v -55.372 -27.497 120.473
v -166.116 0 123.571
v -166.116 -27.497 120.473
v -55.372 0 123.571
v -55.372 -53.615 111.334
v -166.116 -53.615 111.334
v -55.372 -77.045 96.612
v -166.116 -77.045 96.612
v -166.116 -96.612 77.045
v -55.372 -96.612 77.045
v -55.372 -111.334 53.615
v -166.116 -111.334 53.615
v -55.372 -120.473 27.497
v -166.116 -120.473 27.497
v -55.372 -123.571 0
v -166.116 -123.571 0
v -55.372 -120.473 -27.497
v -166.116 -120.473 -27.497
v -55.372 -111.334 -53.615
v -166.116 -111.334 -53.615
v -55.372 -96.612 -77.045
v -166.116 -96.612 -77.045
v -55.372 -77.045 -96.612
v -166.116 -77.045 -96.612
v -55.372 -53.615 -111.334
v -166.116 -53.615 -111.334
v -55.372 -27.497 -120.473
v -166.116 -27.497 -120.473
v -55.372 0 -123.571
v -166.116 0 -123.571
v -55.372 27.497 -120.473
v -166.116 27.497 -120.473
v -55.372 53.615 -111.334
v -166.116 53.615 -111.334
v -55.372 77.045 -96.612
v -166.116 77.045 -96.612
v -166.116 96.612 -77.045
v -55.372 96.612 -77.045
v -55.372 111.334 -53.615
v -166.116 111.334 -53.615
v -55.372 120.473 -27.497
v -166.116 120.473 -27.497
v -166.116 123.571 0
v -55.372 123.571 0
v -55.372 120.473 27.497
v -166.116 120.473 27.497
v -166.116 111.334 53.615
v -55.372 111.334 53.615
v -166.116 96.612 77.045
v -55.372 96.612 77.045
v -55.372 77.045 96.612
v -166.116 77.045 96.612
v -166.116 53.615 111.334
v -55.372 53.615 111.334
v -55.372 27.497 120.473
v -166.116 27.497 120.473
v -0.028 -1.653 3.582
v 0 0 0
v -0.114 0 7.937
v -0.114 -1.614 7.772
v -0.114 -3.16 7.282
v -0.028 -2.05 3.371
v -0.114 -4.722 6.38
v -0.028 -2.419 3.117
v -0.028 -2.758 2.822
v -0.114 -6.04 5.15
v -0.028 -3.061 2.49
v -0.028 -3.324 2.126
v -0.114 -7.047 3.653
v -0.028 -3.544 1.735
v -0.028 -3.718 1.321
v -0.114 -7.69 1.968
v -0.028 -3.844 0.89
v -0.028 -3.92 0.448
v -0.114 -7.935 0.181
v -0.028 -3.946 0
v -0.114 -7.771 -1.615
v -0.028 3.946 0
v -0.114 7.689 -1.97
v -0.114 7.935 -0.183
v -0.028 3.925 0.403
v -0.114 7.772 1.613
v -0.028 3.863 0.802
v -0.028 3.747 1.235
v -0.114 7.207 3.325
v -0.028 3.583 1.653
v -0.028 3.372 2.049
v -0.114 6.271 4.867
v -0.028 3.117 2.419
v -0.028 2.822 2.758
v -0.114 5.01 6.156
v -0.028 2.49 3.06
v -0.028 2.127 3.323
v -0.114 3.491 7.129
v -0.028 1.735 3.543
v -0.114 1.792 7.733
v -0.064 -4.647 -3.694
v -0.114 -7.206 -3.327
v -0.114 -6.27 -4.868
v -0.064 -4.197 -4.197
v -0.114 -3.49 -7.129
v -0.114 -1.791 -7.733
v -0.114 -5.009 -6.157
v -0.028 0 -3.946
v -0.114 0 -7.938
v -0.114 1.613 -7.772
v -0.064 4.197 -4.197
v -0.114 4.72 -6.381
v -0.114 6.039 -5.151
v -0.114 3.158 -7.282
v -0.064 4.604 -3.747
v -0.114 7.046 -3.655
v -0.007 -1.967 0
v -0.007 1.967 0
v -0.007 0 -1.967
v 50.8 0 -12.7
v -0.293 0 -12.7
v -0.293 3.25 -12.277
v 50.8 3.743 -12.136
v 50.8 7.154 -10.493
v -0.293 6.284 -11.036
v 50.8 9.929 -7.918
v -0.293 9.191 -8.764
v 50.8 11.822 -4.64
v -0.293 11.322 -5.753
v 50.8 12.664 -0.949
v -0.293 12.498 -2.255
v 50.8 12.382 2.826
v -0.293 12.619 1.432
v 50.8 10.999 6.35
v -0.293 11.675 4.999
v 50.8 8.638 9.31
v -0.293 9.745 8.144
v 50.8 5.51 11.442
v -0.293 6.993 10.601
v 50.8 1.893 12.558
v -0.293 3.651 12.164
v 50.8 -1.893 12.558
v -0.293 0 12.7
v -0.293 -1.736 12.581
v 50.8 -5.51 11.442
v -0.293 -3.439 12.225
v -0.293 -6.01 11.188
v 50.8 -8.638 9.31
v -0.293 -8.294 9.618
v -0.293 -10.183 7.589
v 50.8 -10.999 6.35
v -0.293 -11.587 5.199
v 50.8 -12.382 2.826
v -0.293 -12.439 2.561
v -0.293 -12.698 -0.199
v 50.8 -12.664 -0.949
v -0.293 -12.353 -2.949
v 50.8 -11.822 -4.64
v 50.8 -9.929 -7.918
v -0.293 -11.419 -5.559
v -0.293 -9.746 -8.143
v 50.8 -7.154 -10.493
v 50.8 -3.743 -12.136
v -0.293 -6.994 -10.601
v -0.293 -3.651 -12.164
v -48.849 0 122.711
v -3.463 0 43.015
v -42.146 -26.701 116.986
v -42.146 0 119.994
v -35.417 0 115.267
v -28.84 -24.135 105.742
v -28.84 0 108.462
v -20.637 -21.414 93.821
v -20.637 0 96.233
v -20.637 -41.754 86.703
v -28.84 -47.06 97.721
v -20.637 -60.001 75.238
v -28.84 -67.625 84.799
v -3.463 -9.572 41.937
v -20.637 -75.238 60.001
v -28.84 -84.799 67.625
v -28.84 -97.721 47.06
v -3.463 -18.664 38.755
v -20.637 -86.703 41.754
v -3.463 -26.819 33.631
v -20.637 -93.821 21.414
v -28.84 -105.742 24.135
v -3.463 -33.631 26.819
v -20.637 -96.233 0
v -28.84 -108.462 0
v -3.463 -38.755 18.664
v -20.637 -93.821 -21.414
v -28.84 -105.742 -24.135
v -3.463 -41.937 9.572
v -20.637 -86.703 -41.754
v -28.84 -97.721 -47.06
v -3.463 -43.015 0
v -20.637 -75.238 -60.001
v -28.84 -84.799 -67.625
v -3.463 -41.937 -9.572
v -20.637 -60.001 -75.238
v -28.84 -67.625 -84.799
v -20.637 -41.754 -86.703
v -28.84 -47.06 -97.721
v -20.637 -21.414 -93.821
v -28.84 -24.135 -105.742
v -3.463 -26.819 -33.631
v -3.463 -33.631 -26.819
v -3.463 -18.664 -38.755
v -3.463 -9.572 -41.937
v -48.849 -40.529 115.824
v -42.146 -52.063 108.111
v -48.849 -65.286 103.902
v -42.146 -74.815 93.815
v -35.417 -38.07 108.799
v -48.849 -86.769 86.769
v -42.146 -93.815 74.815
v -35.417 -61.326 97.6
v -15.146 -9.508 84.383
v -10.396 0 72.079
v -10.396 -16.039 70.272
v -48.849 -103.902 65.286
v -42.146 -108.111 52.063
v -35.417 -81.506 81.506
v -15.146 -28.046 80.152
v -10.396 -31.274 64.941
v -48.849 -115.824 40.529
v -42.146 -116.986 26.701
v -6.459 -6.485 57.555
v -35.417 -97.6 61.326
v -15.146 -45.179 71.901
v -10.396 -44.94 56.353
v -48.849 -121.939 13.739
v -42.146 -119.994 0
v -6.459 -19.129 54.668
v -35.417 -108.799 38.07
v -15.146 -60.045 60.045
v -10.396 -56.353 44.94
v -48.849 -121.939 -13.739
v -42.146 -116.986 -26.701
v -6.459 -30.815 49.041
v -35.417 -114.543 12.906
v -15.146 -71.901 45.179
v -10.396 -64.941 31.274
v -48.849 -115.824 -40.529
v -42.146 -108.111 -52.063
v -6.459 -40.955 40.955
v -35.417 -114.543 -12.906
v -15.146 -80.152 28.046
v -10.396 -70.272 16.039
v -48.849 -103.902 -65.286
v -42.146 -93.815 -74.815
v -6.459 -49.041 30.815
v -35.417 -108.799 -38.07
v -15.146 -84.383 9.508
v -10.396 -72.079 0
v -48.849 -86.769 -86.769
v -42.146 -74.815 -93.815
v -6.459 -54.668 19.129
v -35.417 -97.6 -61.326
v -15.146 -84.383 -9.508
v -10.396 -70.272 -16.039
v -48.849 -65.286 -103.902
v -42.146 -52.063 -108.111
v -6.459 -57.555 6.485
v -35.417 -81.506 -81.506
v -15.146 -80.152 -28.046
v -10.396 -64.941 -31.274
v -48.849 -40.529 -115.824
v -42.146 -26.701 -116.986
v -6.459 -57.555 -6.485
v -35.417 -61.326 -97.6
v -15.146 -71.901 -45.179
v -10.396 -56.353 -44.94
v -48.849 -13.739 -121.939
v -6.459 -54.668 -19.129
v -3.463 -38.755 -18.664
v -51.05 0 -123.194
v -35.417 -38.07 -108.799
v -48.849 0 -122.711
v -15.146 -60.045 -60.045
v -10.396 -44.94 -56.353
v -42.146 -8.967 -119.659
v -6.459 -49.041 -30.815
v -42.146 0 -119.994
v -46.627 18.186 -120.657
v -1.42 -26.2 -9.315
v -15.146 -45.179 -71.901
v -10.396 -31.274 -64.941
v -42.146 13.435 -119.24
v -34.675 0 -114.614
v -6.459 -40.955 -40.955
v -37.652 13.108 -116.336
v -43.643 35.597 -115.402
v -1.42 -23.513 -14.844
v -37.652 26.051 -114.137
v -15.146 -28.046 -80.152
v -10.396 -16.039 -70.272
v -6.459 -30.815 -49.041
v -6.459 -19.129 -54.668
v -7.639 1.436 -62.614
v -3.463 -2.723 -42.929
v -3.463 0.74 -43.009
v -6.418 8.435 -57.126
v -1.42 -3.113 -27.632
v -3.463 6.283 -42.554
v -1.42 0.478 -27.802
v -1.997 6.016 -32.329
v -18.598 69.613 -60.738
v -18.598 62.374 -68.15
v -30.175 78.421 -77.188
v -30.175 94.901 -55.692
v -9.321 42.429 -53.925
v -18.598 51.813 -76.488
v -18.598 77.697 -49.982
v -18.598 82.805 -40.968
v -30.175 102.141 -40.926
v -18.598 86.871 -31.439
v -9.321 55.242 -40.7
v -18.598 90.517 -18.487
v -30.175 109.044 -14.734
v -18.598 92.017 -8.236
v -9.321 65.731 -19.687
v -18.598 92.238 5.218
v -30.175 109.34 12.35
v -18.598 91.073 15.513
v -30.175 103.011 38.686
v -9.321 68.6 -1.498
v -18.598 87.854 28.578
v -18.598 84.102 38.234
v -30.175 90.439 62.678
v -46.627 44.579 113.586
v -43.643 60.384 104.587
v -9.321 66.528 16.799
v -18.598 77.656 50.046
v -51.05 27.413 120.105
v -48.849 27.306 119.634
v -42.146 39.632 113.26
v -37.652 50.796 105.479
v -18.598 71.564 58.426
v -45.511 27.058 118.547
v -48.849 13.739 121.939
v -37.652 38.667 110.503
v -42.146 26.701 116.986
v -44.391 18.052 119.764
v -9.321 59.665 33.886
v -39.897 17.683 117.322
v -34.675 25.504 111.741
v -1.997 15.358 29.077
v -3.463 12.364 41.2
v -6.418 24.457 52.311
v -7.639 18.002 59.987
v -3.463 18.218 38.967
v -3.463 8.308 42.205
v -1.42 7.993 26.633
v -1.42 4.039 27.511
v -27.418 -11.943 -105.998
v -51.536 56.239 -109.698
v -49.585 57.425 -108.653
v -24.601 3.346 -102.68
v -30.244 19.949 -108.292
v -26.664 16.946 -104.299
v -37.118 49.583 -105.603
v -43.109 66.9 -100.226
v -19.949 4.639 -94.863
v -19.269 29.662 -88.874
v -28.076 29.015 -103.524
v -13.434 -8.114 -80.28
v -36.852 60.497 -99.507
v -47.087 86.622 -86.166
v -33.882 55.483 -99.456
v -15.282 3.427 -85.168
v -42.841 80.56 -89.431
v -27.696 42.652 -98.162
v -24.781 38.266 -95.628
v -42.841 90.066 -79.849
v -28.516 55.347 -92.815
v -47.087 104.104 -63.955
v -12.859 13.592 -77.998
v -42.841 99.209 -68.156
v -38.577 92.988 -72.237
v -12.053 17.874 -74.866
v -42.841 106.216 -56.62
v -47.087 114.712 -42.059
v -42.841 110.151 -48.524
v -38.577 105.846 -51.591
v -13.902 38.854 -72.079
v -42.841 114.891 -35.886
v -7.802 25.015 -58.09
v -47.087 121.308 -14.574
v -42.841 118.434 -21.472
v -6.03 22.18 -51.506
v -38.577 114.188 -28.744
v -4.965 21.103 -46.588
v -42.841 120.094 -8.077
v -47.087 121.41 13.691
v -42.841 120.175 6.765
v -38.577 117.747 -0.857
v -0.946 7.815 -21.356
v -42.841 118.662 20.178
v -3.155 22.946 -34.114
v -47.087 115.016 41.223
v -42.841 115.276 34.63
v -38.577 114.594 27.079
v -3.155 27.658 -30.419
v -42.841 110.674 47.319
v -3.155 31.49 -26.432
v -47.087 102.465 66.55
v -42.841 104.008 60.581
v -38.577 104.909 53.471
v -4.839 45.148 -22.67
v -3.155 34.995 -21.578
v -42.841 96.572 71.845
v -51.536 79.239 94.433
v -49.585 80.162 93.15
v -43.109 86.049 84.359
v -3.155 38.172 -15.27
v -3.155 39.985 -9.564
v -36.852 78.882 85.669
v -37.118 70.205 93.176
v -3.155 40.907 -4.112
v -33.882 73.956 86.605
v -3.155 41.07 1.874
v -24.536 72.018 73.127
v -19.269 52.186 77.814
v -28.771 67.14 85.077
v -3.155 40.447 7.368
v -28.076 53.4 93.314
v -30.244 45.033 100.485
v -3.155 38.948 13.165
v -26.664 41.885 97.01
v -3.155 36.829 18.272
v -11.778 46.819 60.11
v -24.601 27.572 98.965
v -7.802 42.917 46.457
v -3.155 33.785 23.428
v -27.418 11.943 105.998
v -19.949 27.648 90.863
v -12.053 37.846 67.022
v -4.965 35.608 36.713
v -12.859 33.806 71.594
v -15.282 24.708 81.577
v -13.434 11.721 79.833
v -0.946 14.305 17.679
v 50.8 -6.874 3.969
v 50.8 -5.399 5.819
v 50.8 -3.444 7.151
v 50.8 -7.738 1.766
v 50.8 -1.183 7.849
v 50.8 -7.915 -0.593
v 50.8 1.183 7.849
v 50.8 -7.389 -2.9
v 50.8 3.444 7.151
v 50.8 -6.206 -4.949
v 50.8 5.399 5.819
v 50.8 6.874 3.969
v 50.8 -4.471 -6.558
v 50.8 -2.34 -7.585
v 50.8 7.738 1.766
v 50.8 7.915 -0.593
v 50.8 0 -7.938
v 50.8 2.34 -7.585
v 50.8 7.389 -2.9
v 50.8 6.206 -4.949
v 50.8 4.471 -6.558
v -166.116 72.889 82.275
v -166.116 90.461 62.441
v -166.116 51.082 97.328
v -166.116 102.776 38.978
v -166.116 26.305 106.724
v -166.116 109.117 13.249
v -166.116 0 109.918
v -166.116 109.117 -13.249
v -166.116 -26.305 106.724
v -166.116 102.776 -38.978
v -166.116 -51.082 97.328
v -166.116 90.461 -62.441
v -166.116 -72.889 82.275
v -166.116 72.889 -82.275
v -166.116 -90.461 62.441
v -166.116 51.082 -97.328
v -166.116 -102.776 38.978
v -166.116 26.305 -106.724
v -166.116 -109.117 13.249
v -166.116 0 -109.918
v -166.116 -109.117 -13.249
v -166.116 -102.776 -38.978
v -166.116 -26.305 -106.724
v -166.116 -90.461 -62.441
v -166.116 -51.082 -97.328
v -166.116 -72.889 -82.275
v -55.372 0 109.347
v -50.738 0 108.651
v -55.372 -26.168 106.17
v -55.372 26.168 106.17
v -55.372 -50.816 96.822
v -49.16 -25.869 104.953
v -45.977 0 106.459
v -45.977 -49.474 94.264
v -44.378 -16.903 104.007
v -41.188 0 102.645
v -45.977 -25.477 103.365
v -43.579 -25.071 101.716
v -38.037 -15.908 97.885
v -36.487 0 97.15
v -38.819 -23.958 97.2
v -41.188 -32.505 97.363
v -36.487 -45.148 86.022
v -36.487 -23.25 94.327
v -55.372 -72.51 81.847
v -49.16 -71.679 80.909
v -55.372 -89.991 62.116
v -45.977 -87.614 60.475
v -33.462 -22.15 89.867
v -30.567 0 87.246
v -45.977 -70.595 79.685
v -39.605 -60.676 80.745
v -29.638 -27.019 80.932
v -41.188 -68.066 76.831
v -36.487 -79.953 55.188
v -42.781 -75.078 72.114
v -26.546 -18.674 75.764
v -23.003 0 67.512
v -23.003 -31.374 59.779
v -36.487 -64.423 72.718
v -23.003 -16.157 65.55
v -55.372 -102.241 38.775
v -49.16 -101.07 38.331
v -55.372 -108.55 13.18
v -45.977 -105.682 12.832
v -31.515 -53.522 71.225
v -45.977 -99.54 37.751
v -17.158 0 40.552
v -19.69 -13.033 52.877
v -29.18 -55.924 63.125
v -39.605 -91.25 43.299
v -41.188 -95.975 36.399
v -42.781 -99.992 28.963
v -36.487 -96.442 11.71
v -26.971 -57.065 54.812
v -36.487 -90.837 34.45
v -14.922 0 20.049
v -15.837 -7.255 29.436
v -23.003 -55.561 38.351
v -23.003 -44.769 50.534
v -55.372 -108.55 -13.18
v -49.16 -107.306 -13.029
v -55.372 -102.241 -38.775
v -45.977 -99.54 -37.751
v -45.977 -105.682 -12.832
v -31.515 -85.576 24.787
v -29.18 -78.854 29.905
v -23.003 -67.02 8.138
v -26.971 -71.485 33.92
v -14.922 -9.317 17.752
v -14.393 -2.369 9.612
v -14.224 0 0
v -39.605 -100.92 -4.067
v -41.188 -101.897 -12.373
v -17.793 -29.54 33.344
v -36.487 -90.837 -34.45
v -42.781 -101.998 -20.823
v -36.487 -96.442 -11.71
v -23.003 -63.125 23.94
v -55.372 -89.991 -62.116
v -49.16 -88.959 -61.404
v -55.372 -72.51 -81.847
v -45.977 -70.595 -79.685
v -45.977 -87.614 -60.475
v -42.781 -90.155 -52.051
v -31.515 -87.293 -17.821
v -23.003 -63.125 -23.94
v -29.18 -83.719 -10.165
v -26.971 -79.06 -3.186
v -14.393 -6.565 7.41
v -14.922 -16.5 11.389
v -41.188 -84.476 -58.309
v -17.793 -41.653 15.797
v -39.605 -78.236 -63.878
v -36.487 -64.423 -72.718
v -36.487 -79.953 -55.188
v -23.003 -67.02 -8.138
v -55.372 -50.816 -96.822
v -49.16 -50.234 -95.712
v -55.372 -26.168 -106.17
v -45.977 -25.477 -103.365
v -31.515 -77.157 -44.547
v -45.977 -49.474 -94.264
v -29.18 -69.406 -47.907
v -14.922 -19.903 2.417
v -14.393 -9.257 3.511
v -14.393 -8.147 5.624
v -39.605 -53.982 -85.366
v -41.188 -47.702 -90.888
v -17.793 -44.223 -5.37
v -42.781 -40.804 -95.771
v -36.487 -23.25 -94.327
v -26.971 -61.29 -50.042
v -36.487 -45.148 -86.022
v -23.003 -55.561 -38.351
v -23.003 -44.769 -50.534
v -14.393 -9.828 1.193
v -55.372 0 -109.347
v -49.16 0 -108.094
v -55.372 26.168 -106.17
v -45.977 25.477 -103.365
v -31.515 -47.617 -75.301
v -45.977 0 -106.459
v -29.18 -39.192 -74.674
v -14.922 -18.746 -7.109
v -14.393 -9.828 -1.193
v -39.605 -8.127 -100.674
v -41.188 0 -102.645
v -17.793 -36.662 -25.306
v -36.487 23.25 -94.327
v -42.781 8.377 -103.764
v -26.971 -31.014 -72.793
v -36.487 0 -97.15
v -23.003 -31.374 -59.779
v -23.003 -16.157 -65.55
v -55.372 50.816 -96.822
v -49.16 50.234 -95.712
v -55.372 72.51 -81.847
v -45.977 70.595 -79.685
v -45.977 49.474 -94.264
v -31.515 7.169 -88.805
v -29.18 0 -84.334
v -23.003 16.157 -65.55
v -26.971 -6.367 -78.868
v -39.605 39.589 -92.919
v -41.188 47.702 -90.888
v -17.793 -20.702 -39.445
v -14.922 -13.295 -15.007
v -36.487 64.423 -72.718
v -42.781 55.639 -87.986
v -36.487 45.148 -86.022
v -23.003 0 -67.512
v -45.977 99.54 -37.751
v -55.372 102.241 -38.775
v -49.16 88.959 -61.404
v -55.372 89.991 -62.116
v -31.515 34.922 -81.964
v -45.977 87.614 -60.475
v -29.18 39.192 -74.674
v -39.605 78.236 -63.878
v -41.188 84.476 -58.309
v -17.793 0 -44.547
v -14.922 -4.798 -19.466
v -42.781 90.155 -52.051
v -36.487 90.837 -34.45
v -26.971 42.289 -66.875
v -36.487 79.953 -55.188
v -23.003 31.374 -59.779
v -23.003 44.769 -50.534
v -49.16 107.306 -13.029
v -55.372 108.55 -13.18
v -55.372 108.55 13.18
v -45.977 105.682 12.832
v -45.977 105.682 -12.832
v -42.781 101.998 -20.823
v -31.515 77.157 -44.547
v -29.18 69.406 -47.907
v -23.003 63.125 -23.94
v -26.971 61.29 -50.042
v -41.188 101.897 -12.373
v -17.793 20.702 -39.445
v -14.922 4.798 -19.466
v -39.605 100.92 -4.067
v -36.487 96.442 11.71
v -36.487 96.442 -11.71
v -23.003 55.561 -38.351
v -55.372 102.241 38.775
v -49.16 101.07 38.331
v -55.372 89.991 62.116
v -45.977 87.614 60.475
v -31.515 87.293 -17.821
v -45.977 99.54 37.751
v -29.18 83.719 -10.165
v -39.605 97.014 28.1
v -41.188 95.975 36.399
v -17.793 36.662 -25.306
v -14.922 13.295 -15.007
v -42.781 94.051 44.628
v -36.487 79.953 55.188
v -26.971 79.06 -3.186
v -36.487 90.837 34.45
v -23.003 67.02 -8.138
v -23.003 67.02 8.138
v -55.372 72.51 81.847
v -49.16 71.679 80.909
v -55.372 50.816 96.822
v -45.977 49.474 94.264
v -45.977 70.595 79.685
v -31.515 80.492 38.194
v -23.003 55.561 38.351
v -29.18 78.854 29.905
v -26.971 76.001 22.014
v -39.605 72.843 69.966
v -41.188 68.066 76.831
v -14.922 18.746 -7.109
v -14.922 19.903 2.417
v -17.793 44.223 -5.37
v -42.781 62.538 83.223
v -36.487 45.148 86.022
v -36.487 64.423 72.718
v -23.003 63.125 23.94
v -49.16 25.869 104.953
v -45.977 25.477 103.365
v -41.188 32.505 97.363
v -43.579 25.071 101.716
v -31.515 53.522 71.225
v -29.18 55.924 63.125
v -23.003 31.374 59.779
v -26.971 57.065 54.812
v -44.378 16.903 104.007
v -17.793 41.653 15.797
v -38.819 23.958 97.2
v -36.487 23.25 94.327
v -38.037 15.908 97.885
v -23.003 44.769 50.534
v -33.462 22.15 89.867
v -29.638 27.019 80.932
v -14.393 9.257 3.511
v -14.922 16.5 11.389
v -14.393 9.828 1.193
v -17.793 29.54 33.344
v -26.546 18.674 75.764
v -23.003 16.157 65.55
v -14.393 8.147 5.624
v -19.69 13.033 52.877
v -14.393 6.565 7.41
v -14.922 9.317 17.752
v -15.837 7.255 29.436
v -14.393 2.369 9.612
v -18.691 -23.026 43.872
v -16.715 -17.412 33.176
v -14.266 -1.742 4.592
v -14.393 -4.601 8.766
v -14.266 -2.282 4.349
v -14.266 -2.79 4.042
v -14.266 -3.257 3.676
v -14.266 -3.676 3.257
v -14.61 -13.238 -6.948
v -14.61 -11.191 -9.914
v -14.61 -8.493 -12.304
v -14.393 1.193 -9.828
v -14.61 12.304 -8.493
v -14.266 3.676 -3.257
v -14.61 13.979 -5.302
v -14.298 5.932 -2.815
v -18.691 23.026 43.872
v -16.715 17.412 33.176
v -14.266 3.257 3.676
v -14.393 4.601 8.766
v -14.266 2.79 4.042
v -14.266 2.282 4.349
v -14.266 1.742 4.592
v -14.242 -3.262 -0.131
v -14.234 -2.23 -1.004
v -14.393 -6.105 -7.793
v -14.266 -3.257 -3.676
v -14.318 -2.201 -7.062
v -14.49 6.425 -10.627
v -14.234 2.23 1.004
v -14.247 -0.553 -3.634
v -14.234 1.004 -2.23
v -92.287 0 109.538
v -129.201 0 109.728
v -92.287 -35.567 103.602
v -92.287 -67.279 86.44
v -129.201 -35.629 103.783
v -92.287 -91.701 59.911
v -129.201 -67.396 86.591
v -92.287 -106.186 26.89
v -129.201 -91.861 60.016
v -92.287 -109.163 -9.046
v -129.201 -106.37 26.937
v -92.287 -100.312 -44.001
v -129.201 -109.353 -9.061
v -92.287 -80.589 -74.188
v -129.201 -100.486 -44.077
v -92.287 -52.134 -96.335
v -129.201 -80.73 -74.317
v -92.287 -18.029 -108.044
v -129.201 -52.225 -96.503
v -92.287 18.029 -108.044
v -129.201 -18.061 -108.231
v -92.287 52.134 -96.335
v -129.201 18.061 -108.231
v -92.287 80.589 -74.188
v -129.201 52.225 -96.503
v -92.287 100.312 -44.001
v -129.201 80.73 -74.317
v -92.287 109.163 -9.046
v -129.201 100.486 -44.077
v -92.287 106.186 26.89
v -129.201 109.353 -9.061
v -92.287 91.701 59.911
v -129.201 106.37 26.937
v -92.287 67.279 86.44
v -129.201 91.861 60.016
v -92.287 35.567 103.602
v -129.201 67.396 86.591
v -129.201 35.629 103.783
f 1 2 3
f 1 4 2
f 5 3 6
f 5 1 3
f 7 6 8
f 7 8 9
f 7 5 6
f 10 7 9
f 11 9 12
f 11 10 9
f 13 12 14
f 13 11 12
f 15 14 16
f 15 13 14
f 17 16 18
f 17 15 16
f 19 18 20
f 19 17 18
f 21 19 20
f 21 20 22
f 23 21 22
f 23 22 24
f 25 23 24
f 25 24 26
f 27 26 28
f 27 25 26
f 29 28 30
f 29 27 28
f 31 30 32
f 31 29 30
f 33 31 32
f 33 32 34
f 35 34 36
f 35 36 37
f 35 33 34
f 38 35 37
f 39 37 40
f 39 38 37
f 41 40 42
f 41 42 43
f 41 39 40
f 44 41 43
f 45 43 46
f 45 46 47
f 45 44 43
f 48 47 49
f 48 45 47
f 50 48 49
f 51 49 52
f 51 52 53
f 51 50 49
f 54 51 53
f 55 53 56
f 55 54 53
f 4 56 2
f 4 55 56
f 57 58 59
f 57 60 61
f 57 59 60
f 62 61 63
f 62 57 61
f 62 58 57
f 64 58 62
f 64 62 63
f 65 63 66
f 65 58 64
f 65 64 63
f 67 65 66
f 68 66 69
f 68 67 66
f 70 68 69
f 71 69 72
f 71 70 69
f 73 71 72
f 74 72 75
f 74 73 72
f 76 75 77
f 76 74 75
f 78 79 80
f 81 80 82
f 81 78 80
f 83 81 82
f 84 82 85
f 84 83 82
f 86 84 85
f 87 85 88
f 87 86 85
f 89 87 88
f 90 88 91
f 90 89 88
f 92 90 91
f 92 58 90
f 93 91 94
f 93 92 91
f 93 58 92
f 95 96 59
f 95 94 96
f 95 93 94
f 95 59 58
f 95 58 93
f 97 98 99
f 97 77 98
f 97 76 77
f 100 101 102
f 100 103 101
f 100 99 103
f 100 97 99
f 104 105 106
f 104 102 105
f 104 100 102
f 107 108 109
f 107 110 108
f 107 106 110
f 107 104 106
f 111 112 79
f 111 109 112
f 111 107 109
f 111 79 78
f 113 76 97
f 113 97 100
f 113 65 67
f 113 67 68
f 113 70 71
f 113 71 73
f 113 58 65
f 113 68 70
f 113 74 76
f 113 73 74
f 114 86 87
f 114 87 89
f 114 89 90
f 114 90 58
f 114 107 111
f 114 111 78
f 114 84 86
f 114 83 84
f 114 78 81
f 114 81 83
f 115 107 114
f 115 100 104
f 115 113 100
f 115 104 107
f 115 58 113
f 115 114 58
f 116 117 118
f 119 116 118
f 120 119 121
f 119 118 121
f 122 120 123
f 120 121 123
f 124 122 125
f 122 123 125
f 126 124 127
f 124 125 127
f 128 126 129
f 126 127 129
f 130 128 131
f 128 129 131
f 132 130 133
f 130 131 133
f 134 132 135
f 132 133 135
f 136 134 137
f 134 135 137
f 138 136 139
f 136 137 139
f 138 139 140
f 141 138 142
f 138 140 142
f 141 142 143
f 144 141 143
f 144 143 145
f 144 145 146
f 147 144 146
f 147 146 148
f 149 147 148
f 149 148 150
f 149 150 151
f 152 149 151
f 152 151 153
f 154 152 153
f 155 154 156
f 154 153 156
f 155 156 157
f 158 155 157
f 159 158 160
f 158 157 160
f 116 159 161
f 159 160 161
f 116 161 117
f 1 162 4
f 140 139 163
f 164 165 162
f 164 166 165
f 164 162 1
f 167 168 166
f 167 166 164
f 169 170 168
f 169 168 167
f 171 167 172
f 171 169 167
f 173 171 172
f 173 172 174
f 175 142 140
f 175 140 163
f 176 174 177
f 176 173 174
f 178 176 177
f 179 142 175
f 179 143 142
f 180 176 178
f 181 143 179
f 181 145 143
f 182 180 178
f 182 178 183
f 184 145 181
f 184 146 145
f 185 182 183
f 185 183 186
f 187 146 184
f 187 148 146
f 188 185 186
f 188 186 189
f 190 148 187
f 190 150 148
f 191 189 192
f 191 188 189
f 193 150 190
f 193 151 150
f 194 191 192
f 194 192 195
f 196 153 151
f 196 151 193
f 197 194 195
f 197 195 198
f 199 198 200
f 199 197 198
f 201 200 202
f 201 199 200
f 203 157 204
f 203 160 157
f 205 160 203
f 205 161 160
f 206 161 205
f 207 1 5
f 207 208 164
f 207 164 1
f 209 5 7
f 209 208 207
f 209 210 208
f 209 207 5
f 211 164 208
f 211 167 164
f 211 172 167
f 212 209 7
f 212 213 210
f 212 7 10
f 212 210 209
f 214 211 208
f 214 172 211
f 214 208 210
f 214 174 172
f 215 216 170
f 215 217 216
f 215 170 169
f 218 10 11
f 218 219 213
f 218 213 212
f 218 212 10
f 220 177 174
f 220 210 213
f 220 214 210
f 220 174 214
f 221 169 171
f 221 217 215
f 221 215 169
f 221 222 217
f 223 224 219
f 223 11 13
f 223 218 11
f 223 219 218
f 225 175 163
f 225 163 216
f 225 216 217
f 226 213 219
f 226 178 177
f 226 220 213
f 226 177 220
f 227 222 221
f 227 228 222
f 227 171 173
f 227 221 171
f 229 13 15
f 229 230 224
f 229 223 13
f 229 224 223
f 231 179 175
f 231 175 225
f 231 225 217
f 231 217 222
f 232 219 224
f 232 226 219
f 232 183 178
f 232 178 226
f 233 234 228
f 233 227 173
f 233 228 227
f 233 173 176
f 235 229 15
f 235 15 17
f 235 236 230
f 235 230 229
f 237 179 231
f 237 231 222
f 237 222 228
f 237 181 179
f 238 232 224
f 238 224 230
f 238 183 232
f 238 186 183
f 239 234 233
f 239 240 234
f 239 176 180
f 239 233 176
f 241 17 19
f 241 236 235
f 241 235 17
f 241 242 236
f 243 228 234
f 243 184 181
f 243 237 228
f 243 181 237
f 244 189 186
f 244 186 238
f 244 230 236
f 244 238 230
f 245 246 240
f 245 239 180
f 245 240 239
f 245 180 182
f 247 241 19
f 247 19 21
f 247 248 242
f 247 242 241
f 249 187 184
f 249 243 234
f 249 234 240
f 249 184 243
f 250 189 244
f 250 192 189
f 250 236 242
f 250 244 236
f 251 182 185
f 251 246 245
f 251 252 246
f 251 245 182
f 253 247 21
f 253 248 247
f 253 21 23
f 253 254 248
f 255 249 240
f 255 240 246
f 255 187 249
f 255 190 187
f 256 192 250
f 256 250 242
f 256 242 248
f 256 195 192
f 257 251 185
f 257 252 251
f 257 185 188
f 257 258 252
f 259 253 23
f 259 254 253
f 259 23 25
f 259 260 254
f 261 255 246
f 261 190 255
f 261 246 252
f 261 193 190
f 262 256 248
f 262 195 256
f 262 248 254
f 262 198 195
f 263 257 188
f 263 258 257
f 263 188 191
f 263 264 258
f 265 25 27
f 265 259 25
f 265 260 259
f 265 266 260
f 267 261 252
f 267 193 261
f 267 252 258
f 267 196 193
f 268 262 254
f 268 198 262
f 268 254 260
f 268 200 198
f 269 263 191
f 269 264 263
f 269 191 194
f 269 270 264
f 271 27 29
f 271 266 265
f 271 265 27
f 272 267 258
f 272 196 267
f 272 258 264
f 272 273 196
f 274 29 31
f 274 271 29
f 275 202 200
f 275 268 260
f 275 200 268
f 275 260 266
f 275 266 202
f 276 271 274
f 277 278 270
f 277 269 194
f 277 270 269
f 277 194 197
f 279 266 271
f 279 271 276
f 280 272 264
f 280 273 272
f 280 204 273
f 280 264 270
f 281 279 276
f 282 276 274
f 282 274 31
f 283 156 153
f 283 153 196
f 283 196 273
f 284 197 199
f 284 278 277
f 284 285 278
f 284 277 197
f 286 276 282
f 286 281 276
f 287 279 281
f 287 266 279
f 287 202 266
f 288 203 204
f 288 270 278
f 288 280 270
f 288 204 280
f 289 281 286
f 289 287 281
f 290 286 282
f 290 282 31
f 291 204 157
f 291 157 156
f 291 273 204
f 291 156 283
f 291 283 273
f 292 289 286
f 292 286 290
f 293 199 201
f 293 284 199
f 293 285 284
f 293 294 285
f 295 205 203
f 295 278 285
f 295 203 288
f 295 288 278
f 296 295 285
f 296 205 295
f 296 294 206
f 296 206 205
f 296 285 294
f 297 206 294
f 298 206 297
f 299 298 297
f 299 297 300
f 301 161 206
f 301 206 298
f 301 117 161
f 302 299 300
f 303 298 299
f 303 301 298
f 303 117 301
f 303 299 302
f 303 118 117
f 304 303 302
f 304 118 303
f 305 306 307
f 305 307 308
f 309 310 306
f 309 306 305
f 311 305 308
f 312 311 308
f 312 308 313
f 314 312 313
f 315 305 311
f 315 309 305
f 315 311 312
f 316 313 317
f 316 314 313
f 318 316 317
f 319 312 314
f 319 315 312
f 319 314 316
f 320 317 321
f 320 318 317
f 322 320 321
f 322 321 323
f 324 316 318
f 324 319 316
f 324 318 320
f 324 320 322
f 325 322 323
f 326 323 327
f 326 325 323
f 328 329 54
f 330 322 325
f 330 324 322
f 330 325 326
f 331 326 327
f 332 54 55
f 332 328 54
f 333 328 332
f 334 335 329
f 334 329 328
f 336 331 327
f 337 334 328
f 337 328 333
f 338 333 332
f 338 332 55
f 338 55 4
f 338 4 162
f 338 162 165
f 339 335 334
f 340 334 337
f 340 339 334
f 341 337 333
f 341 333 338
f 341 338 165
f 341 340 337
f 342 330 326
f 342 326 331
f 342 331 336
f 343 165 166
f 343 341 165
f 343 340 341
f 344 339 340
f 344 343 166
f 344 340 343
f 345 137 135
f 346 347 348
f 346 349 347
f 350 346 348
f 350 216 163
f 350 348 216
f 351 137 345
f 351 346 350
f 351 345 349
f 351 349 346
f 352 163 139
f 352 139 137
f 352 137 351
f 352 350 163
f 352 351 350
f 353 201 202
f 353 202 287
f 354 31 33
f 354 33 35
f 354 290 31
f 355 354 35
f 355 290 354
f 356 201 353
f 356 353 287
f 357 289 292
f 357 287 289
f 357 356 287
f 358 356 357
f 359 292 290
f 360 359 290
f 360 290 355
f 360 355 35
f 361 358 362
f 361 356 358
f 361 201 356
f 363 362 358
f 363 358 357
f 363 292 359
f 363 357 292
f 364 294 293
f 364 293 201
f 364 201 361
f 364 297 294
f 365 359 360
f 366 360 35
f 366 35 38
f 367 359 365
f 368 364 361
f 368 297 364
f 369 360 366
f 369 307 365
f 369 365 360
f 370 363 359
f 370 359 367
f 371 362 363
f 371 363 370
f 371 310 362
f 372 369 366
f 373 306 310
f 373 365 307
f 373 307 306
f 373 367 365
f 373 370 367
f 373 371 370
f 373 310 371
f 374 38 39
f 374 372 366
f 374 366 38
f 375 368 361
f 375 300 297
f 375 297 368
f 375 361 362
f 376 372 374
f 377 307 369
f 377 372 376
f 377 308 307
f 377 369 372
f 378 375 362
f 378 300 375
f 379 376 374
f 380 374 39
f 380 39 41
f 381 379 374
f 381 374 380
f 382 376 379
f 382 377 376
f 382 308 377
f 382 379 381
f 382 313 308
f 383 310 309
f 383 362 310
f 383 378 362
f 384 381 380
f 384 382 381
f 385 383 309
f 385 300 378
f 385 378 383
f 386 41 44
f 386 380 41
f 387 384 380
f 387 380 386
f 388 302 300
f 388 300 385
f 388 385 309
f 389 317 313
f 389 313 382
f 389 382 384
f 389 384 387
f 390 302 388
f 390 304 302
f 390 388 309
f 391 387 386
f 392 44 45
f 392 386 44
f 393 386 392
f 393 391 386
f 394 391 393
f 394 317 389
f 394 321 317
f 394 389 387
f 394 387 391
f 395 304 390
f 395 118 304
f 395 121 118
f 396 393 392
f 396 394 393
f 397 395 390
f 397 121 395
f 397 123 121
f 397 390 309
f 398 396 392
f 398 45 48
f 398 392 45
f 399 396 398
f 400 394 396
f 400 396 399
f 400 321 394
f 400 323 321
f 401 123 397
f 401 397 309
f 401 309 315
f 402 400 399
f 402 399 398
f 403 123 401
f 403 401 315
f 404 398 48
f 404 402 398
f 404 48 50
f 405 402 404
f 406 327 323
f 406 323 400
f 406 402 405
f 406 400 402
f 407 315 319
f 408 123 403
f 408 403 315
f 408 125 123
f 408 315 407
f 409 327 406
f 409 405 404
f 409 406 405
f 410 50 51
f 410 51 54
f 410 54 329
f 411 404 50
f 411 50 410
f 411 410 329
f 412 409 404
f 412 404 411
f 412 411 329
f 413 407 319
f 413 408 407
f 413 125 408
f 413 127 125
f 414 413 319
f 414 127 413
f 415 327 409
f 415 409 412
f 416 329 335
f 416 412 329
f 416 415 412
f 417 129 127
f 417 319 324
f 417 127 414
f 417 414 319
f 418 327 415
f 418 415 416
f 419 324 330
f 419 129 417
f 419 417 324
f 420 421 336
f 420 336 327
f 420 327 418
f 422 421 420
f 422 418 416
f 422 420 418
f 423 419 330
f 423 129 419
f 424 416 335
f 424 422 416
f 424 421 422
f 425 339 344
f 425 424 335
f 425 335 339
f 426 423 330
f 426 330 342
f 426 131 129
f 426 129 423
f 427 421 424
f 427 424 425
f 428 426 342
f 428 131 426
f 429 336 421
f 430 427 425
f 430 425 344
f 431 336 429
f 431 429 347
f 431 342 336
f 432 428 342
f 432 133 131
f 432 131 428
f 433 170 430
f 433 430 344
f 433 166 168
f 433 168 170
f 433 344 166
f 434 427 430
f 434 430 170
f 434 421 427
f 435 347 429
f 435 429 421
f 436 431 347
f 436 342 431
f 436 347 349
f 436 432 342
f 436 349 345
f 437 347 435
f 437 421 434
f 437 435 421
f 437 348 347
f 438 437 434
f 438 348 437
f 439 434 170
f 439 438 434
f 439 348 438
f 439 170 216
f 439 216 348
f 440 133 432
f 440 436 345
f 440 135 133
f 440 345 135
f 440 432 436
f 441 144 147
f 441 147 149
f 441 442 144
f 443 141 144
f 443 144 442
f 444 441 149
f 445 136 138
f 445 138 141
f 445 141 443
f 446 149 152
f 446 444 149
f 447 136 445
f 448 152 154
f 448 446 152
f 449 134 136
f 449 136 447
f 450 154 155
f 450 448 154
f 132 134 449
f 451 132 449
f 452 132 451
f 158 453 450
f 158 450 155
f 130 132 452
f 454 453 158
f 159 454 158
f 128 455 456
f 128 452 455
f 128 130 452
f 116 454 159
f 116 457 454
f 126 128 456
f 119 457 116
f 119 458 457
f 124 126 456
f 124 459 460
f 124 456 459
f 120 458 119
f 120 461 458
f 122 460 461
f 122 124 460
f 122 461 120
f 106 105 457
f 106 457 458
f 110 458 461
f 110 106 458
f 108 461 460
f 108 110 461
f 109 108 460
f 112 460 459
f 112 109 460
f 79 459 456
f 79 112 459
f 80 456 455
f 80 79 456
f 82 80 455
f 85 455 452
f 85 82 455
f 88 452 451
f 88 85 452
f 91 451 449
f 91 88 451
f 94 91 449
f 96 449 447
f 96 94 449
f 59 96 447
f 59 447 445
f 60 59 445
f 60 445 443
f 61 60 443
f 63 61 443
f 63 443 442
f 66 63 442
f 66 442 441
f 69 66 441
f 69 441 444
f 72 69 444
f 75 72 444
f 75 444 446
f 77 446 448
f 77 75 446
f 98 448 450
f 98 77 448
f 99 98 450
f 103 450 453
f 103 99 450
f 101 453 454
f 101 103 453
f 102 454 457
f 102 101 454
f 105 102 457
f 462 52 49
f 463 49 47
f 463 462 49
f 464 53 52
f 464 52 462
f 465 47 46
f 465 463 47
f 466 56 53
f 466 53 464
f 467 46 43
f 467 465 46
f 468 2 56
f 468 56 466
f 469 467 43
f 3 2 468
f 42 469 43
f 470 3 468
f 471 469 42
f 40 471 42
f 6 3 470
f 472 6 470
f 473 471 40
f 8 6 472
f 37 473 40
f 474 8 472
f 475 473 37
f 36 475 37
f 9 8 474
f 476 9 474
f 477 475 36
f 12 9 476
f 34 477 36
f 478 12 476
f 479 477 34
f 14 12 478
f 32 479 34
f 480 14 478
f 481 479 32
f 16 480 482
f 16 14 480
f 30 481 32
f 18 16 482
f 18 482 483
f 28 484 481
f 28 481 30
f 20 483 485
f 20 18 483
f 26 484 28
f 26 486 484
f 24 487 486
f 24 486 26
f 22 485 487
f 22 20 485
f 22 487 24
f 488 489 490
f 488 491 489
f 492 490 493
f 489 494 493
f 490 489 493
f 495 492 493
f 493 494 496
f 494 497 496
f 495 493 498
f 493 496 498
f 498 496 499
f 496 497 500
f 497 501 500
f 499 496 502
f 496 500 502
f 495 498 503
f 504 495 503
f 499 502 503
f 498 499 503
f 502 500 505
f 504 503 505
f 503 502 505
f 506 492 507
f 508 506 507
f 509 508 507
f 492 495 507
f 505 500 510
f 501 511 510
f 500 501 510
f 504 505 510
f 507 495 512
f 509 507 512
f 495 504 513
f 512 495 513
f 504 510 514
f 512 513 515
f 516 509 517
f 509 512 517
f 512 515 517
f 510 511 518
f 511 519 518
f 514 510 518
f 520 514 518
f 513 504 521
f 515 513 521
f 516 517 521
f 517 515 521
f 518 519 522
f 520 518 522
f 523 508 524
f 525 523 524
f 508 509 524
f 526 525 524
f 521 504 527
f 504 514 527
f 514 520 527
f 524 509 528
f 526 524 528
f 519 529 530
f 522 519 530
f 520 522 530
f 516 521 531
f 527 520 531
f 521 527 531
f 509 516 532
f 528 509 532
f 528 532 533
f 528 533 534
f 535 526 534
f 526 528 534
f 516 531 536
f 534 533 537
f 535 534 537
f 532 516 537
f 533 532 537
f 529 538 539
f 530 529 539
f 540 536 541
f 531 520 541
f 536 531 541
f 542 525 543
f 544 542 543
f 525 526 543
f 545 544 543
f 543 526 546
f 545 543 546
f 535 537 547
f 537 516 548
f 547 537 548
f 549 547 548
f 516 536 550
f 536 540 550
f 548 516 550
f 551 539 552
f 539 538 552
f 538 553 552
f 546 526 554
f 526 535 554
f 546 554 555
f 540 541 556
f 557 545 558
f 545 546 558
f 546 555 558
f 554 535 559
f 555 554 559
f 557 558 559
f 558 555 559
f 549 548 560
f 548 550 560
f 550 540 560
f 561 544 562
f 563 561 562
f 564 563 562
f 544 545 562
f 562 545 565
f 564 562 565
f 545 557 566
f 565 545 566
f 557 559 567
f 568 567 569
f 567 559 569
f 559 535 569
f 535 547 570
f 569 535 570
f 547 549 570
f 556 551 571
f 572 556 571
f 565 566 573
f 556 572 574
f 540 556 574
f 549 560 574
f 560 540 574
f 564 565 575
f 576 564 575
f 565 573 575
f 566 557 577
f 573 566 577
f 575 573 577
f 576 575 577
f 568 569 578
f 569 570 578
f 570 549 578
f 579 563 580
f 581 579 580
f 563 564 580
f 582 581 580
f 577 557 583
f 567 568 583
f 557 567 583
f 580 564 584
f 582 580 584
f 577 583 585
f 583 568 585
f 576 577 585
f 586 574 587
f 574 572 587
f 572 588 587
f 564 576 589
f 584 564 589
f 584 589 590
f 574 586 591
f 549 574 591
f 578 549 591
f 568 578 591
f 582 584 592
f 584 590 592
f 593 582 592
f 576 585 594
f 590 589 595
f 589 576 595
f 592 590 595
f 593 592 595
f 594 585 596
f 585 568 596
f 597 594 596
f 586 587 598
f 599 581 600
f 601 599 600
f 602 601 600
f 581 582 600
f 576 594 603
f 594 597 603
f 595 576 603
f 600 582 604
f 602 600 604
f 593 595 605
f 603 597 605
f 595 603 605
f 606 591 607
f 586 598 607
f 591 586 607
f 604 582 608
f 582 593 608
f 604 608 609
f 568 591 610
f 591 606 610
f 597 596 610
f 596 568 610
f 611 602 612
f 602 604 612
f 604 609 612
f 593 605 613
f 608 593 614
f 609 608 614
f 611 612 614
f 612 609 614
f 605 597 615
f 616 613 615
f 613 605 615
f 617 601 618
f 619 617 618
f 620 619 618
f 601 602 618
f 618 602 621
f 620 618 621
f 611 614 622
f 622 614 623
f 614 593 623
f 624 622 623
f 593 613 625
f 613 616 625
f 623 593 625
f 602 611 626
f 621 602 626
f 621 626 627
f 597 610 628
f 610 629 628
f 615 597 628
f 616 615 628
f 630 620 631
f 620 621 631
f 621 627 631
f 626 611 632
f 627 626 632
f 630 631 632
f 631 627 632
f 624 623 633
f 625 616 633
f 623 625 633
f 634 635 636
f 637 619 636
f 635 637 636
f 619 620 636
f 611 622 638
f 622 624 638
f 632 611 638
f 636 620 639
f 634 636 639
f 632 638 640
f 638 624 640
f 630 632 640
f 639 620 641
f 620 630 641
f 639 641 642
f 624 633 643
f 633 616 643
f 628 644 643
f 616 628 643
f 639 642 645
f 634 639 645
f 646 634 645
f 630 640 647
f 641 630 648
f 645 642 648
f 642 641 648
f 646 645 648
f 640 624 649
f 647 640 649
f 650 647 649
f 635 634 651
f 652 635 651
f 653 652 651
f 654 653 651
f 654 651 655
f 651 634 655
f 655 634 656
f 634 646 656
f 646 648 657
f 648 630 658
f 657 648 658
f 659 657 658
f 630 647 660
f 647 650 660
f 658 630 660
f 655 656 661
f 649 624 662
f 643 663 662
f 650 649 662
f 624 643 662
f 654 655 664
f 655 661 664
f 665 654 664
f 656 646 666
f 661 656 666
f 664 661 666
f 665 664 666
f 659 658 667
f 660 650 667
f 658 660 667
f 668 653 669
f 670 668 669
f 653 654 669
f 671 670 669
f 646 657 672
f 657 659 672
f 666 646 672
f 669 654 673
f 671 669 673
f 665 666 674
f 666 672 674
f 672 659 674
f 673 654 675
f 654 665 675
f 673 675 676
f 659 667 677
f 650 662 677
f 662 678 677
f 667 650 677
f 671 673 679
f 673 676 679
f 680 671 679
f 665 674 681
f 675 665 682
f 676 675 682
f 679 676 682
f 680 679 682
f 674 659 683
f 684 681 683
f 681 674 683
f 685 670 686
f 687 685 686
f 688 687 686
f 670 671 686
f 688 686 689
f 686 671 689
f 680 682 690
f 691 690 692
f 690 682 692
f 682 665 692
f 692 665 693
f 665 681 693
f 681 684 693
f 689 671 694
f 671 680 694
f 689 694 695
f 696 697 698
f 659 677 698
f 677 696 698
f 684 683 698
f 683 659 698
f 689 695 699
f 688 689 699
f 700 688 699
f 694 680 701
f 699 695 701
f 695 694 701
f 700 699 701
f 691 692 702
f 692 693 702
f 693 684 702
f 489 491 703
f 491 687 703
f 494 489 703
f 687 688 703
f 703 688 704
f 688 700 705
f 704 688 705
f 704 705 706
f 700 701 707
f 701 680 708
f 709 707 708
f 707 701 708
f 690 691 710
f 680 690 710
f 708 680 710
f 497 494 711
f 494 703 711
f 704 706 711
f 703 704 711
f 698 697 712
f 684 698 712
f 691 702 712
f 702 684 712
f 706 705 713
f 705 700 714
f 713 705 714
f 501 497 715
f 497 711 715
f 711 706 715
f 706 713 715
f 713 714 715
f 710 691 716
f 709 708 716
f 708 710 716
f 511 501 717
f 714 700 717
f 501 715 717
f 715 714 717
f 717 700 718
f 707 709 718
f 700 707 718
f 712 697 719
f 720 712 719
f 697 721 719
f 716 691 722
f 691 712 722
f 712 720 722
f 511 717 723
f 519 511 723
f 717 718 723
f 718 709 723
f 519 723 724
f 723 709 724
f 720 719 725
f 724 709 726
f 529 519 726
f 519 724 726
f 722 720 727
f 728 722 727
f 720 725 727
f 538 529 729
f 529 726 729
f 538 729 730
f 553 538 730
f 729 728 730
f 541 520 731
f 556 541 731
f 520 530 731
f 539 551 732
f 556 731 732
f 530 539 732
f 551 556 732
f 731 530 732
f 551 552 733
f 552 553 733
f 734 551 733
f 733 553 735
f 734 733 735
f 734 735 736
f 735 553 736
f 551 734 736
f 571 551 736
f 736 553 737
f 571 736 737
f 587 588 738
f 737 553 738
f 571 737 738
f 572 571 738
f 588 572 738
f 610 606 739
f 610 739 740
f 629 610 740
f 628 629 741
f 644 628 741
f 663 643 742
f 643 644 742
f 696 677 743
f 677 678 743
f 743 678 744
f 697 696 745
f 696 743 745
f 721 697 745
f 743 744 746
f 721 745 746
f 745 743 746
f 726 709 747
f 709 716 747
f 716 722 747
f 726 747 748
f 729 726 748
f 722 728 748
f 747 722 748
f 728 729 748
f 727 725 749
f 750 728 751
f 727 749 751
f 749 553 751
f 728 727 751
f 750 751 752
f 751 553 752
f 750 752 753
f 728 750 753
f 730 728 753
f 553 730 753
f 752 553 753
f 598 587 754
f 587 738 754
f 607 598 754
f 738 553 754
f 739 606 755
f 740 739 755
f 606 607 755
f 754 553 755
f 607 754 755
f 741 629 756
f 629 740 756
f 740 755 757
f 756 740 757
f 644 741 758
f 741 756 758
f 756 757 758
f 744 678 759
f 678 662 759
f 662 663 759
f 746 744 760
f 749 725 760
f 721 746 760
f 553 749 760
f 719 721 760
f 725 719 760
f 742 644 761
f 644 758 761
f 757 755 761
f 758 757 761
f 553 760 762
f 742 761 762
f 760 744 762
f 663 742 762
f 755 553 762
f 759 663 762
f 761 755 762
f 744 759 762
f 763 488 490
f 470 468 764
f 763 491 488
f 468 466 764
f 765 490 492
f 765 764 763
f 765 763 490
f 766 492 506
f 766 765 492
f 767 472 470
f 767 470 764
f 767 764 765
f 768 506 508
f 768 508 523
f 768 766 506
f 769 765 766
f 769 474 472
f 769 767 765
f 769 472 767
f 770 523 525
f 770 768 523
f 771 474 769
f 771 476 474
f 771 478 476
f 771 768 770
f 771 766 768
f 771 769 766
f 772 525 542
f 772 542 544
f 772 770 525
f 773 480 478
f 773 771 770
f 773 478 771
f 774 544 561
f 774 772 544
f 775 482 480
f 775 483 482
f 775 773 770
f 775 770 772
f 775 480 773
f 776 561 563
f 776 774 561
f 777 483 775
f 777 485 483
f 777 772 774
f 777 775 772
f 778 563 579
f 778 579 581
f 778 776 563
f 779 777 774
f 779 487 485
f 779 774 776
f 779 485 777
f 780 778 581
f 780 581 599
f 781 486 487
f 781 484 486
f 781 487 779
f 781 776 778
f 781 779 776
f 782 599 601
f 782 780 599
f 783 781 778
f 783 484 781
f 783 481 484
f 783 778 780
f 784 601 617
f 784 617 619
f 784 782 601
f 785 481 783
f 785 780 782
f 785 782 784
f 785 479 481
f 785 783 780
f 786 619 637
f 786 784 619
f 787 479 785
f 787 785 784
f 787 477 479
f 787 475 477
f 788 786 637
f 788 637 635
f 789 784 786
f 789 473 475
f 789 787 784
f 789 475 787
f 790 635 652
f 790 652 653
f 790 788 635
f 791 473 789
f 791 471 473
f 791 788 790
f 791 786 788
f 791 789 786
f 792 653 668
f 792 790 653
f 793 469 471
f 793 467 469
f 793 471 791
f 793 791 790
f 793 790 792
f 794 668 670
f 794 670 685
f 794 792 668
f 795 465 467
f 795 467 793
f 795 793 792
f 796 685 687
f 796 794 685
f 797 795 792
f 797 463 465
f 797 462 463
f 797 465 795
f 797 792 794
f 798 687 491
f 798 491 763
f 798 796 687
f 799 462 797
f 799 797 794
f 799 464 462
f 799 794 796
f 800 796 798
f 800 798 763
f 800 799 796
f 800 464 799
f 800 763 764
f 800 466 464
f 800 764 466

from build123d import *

# Parameters (mm, degrees)
BOSS_EXTRUDE1_DEPTH      = 50.8
BOSS_EXTRUDE1_DEPTH_BACK = 3.556
SKETCH2_R                = 12.7
SKETCH2_R_2              = 7.9375


with BuildPart() as part:
    # Sketch1 → Revolve1 (revolve)
    with BuildSketch(Plane.XY, mode=Mode.PRIVATE) as revolve1_sk:
        with BuildLine():
            Line((-166.116, -123.571), (-55.372, -123.571))
            add(Edge.make_bspline(
                [(-55.372, -123.571), (0, -123.571), (0, 0)],
                knots=[3.141592654, 3.141592654, 3.141592654, 4.71238898, 4.71238898, 4.71238898], degree=2, weights=[1, 0.707106781, 1]))
            Line((0, 0), (-14.224, 0))
            add(Edge.make_bspline(
                [(-55.372, -109.347), (-14.224, -109.347), (-14.224, 0)],
                knots=[0, 0, 0, 1.570796327, 1.570796327, 1.570796327], degree=2, weights=[1, 0.707106781, 1]))
            Line((-55.372, -109.347), (-166.116, -109.9185))
            Line((-166.116, -109.9185), (-166.116, -123.571))
        make_face()
    revolve(revolve1_sk.sketch.rotate(Axis((-166.116, 0, 0), (1, 0, 0)), 270), axis=Axis((-166.116, 0, 0), (1, 0, 0)))

    # Sketch2 → Boss-Extrude1 (add, two sides: drawn at the far end of the back side and taken through both)
    with BuildSketch(Plane(origin=(0, 0, 0), x_dir=(0, 0, -1), z_dir=(1, 0, 0)).offset(-BOSS_EXTRUDE1_DEPTH_BACK)):
        Circle(SKETCH2_R)
        Circle(SKETCH2_R_2, mode=Mode.SUBTRACT)
    extrude(amount=BOSS_EXTRUDE1_DEPTH + BOSS_EXTRUDE1_DEPTH_BACK)


solid = part.part
